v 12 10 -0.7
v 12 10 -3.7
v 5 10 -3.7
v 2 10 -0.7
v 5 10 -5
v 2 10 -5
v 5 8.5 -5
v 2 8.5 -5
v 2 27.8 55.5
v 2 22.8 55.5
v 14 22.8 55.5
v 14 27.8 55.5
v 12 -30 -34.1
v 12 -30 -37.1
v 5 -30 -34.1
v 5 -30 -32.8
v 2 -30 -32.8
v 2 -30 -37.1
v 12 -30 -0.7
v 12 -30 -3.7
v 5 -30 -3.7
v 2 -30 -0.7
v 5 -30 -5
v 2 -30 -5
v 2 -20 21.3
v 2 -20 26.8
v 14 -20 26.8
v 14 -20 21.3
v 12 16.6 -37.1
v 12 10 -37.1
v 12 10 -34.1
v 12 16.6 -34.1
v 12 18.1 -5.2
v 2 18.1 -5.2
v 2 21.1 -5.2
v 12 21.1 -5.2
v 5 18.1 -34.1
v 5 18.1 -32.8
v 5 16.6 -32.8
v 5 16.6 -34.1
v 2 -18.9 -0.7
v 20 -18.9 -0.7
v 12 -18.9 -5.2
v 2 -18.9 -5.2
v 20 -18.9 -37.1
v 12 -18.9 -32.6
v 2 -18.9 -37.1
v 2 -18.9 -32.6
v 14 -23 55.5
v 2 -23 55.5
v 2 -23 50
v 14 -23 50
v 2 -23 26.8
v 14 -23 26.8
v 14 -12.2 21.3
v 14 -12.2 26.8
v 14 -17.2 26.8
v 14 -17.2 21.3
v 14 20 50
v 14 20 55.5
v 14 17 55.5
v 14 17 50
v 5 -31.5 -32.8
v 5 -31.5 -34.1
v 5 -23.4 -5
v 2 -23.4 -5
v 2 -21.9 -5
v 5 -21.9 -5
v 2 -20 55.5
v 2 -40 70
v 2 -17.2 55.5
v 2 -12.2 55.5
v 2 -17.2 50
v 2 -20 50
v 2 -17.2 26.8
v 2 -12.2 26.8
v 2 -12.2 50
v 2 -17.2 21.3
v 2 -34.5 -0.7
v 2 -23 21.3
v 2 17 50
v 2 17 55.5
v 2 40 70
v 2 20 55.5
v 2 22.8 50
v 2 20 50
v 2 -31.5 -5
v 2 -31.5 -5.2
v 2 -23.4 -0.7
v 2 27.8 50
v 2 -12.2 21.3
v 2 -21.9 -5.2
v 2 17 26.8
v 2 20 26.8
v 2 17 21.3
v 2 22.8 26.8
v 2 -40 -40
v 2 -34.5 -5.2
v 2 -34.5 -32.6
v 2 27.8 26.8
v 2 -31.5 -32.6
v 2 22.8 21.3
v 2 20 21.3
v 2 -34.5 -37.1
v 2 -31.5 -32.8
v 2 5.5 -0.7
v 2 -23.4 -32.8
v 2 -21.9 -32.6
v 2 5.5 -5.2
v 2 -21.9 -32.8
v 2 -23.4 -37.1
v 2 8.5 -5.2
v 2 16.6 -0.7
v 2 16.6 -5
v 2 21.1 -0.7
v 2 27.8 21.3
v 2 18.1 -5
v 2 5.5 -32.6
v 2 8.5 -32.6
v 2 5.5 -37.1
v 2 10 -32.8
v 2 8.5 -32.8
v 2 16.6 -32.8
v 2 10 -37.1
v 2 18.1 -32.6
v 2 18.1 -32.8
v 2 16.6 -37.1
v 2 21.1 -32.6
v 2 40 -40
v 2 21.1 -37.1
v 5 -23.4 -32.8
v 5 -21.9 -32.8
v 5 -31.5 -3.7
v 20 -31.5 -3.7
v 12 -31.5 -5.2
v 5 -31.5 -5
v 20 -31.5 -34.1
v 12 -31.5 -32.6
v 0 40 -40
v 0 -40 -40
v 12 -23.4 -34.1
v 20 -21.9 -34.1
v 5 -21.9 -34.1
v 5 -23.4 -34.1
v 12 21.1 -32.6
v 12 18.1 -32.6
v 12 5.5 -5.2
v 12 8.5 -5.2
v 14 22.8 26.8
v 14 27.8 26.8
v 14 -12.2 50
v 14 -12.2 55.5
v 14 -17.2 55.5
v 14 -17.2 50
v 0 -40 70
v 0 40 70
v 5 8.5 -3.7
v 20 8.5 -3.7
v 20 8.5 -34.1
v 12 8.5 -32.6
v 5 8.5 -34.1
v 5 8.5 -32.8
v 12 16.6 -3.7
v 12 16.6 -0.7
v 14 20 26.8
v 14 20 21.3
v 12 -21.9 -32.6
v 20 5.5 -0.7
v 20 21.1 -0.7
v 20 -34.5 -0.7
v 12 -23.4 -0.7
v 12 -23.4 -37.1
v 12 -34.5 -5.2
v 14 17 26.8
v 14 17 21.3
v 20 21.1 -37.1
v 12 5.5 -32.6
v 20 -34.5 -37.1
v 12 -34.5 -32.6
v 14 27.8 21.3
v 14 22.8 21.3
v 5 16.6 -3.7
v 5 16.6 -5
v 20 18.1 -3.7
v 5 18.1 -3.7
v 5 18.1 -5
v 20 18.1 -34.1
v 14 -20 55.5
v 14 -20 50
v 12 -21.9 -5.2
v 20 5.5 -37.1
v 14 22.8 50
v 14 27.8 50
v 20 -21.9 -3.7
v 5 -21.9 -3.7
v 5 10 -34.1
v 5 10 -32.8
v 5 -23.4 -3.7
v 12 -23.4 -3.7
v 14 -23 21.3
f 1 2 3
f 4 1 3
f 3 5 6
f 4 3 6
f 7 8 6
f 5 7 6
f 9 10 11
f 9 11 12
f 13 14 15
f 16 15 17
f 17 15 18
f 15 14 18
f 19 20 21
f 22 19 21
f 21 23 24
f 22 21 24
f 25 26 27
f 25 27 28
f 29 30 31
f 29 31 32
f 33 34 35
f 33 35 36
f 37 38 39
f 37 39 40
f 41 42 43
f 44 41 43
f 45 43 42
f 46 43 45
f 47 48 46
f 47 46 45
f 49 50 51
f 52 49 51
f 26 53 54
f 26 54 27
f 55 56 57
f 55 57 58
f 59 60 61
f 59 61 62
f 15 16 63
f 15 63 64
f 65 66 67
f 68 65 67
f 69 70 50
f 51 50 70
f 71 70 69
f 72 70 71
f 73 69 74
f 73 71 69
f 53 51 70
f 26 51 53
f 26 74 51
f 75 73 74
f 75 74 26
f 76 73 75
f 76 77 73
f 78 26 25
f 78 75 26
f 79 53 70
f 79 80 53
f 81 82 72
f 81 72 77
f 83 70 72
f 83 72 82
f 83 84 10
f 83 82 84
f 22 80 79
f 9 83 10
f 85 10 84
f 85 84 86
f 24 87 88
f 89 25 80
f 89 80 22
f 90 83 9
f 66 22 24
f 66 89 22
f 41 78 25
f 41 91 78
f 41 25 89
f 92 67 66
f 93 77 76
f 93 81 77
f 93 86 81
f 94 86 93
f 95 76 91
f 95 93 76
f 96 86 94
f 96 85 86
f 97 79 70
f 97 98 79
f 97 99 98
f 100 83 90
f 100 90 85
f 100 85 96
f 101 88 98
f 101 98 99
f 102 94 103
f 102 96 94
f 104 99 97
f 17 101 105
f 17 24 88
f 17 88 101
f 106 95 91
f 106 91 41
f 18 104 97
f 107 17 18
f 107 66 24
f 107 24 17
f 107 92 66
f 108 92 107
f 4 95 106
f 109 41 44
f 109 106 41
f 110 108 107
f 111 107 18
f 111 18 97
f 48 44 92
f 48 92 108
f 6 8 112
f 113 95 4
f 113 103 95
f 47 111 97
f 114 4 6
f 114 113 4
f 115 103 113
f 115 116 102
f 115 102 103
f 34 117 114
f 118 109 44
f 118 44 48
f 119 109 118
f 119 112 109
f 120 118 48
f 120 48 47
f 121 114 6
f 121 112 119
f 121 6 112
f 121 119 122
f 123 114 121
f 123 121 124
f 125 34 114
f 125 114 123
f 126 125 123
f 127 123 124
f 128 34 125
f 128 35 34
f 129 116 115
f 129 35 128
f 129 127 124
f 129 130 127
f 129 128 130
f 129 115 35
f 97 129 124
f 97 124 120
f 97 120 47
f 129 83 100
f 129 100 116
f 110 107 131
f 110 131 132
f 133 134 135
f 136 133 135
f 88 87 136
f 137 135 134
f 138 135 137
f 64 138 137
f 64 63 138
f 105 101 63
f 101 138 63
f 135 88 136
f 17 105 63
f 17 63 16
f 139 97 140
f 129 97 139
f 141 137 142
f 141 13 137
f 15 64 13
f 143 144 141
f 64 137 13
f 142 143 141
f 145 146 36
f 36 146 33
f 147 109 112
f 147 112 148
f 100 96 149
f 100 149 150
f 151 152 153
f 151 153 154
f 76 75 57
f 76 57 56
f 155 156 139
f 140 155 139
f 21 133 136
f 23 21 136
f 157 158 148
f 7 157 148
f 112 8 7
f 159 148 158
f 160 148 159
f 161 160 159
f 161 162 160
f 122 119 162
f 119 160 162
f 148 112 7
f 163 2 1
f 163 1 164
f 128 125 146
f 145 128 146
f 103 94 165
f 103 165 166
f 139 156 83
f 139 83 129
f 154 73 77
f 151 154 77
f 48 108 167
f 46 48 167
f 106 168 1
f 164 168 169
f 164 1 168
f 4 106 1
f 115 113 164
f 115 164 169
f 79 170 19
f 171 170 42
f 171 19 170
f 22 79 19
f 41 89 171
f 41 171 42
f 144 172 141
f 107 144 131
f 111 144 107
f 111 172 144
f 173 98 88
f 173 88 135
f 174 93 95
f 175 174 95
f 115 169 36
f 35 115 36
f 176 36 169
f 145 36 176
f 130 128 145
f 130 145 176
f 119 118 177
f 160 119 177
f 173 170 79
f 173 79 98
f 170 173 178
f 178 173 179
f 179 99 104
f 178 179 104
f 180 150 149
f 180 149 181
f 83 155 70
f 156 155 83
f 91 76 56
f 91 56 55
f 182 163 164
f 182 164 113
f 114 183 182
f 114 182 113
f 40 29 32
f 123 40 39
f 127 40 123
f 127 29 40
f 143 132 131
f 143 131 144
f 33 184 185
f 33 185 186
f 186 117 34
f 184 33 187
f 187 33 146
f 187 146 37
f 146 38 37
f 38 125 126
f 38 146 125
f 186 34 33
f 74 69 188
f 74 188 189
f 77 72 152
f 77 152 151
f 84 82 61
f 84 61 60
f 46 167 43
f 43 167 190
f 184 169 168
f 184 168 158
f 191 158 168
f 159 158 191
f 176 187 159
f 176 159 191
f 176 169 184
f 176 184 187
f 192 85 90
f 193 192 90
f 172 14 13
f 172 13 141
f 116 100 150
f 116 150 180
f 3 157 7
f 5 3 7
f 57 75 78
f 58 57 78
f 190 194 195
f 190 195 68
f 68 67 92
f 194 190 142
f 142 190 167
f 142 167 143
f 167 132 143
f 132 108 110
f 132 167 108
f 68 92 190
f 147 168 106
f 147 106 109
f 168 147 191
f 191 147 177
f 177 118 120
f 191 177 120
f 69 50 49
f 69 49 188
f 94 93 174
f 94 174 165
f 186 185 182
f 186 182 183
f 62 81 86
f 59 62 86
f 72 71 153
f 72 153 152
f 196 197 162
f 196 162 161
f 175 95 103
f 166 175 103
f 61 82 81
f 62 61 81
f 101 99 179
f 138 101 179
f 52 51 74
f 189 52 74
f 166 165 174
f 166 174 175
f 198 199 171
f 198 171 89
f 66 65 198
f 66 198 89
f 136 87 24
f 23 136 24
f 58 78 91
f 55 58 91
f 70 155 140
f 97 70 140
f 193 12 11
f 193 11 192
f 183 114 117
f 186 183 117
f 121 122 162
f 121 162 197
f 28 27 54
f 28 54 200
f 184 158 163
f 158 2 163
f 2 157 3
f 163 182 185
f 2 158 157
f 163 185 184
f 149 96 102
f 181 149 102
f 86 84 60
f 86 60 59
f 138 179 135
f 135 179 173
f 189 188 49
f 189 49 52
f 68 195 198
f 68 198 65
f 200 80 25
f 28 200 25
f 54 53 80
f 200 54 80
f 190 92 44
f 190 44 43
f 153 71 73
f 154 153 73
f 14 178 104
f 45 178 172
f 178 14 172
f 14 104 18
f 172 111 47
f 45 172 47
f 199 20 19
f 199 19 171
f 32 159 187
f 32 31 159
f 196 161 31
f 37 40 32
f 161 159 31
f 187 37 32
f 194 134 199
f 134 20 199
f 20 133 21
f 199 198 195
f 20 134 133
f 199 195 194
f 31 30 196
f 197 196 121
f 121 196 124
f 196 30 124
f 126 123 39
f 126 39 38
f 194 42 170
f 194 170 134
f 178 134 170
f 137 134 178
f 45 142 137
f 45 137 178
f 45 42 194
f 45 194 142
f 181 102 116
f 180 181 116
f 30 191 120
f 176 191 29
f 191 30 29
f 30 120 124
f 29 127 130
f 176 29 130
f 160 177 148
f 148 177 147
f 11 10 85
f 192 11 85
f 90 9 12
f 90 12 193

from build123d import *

# Parameters (mm, degrees)
SKETCH_1_W             = 140
SKETCH_1_H             = 80
EXTRUDE_1_DEPTH        = 2
SKETCH_2_W             = 5.5
SKETCH_2_H             = 5
SKETCH_2_H_2           = 3
EXTRUDE_2_DEPTH        = 12
SKETCH_3_W             = 30
SKETCH_3_H             = 80
CUT_EXTRUDE_1_DEPTH    = 3
SKETCH_4_W             = 36.4
SKETCH_4_H             = 15.6
SKETCH_4_W_2           = 30.4
SKETCH_4_H_2           = 9.6
EXTRUDE_3_DEPTH        = 18
SKETCH_5_W             = 10
SKETCH_5_H             = 27.4
CUT_EXTRUDE_2_DEPTH    = 20
SKETCH_6_W             = 1.3
SKETCH_6_H             = 9.6
EXTRUDE_4_DEPTH        = 3
SKETCH_8_W             = 10
SKETCH_8_H             = 6.6
CUT_EXTRUDE_3_DEPTH    = 40
PATTERN_LINEAR_1_COUNT = 2
PATTERN_LINEAR_1_PITCH = 40


with BuildPart() as part:
    # 草图1 → 凸台-拉伸1 (new body)
    with BuildSketch(Plane(origin=(0, 0, 0), x_dir=(0, 0, -1), z_dir=(1, 0, 0))):
        Rectangle(SKETCH_1_W, SKETCH_1_H)
    extrude(amount=EXTRUDE_1_DEPTH)

    # 草图2 → 凸台-拉伸2 (add)
    with BuildSketch(Plane(origin=(2, 0, 0), x_dir=(0, 0, -1), z_dir=(1, 0, 0))):
        with Locations((-24.05, -14.7)):
            Rectangle(SKETCH_2_W, SKETCH_2_H)
        with Locations((-52.75, -14.7)):
            Rectangle(SKETCH_2_W, SKETCH_2_H)
        with Locations((-24.05, -21.5)):
            Rectangle(SKETCH_2_W, SKETCH_2_H_2)
        with Locations((-52.75, 18.5)):
            Rectangle(SKETCH_2_W, SKETCH_2_H_2)
        with Locations((-24.05, 25.3)):
            Rectangle(SKETCH_2_W, SKETCH_2_H)
        with Locations((-52.75, -21.5)):
            Rectangle(SKETCH_2_W, SKETCH_2_H_2)
        with Locations((-24.05, 18.5)):
            Rectangle(SKETCH_2_W, SKETCH_2_H_2)
        with Locations((-52.75, 25.3)):
            Rectangle(SKETCH_2_W, SKETCH_2_H)
    extrude(amount=EXTRUDE_2_DEPTH)

    # 草图3 → 切除-拉伸1 (cut)
    with BuildSketch(Plane(origin=(2, 0, 0), x_dir=(0, 0, -1), z_dir=(1, 0, 0))):
        with Locations((55, 0)):
            Rectangle(SKETCH_3_W, SKETCH_3_H)
    extrude(amount=-CUT_EXTRUDE_1_DEPTH, mode=Mode.SUBTRACT)

    # 草图4 → 凸台-拉伸3 (add)
    with BuildSketch(Plane(origin=(2, 0, 0), x_dir=(0, 0, -1), z_dir=(1, 0, 0))):
        with Locations((18.9, -26.7)):
            Rectangle(SKETCH_4_W, SKETCH_4_H)
        with Locations((18.9, -26.7)):
            Rectangle(SKETCH_4_W_2, SKETCH_4_H_2, mode=Mode.SUBTRACT)
    extrude_3 = extrude(amount=EXTRUDE_3_DEPTH)

    # 草图5 → 切除-拉伸2 (cut)
    with BuildSketch(Plane.XZ.offset(34.5)):
        with Locations((7, -18.9)):
            Rectangle(SKETCH_5_W, SKETCH_5_H)
    cut_extrude_2 = extrude(amount=-CUT_EXTRUDE_2_DEPTH, mode=Mode.SUBTRACT)

    # 草图6 → 凸台-拉伸4 (add)
    with BuildSketch(Plane(origin=(2, 0, 0), x_dir=(0, 0, -1), z_dir=(1, 0, 0))):
        with Locations((4.35, -26.7)):
            Rectangle(SKETCH_6_W, SKETCH_6_H)
        with Locations((33.45, -26.7)):
            Rectangle(SKETCH_6_W, SKETCH_6_H)
    extrude_4 = extrude(amount=EXTRUDE_4_DEPTH)

    # 草图8 → 切除-拉伸3 (cut)
    with BuildSketch(Plane(origin=(0, 0, -37.1), x_dir=(-1, 0, 0), z_dir=(0, 0, -1))):
        with Locations((-7, -26.7)):
            Rectangle(SKETCH_8_W, SKETCH_8_H)
    cut_extrude_3 = extrude(amount=-CUT_EXTRUDE_3_DEPTH, mode=Mode.SUBTRACT)

    # 阵列(线性)1: 凸台-拉伸3, 切除-拉伸2, 凸台-拉伸4, 切除-拉伸3 ×2
    with Locations(*[(0, i * PATTERN_LINEAR_1_PITCH, 0) for i in range(1, PATTERN_LINEAR_1_COUNT)]):
        add(extrude_3)
        add(cut_extrude_2, mode=Mode.SUBTRACT)
        add(extrude_4)
        add(cut_extrude_3, mode=Mode.SUBTRACT)


solid = part.part
